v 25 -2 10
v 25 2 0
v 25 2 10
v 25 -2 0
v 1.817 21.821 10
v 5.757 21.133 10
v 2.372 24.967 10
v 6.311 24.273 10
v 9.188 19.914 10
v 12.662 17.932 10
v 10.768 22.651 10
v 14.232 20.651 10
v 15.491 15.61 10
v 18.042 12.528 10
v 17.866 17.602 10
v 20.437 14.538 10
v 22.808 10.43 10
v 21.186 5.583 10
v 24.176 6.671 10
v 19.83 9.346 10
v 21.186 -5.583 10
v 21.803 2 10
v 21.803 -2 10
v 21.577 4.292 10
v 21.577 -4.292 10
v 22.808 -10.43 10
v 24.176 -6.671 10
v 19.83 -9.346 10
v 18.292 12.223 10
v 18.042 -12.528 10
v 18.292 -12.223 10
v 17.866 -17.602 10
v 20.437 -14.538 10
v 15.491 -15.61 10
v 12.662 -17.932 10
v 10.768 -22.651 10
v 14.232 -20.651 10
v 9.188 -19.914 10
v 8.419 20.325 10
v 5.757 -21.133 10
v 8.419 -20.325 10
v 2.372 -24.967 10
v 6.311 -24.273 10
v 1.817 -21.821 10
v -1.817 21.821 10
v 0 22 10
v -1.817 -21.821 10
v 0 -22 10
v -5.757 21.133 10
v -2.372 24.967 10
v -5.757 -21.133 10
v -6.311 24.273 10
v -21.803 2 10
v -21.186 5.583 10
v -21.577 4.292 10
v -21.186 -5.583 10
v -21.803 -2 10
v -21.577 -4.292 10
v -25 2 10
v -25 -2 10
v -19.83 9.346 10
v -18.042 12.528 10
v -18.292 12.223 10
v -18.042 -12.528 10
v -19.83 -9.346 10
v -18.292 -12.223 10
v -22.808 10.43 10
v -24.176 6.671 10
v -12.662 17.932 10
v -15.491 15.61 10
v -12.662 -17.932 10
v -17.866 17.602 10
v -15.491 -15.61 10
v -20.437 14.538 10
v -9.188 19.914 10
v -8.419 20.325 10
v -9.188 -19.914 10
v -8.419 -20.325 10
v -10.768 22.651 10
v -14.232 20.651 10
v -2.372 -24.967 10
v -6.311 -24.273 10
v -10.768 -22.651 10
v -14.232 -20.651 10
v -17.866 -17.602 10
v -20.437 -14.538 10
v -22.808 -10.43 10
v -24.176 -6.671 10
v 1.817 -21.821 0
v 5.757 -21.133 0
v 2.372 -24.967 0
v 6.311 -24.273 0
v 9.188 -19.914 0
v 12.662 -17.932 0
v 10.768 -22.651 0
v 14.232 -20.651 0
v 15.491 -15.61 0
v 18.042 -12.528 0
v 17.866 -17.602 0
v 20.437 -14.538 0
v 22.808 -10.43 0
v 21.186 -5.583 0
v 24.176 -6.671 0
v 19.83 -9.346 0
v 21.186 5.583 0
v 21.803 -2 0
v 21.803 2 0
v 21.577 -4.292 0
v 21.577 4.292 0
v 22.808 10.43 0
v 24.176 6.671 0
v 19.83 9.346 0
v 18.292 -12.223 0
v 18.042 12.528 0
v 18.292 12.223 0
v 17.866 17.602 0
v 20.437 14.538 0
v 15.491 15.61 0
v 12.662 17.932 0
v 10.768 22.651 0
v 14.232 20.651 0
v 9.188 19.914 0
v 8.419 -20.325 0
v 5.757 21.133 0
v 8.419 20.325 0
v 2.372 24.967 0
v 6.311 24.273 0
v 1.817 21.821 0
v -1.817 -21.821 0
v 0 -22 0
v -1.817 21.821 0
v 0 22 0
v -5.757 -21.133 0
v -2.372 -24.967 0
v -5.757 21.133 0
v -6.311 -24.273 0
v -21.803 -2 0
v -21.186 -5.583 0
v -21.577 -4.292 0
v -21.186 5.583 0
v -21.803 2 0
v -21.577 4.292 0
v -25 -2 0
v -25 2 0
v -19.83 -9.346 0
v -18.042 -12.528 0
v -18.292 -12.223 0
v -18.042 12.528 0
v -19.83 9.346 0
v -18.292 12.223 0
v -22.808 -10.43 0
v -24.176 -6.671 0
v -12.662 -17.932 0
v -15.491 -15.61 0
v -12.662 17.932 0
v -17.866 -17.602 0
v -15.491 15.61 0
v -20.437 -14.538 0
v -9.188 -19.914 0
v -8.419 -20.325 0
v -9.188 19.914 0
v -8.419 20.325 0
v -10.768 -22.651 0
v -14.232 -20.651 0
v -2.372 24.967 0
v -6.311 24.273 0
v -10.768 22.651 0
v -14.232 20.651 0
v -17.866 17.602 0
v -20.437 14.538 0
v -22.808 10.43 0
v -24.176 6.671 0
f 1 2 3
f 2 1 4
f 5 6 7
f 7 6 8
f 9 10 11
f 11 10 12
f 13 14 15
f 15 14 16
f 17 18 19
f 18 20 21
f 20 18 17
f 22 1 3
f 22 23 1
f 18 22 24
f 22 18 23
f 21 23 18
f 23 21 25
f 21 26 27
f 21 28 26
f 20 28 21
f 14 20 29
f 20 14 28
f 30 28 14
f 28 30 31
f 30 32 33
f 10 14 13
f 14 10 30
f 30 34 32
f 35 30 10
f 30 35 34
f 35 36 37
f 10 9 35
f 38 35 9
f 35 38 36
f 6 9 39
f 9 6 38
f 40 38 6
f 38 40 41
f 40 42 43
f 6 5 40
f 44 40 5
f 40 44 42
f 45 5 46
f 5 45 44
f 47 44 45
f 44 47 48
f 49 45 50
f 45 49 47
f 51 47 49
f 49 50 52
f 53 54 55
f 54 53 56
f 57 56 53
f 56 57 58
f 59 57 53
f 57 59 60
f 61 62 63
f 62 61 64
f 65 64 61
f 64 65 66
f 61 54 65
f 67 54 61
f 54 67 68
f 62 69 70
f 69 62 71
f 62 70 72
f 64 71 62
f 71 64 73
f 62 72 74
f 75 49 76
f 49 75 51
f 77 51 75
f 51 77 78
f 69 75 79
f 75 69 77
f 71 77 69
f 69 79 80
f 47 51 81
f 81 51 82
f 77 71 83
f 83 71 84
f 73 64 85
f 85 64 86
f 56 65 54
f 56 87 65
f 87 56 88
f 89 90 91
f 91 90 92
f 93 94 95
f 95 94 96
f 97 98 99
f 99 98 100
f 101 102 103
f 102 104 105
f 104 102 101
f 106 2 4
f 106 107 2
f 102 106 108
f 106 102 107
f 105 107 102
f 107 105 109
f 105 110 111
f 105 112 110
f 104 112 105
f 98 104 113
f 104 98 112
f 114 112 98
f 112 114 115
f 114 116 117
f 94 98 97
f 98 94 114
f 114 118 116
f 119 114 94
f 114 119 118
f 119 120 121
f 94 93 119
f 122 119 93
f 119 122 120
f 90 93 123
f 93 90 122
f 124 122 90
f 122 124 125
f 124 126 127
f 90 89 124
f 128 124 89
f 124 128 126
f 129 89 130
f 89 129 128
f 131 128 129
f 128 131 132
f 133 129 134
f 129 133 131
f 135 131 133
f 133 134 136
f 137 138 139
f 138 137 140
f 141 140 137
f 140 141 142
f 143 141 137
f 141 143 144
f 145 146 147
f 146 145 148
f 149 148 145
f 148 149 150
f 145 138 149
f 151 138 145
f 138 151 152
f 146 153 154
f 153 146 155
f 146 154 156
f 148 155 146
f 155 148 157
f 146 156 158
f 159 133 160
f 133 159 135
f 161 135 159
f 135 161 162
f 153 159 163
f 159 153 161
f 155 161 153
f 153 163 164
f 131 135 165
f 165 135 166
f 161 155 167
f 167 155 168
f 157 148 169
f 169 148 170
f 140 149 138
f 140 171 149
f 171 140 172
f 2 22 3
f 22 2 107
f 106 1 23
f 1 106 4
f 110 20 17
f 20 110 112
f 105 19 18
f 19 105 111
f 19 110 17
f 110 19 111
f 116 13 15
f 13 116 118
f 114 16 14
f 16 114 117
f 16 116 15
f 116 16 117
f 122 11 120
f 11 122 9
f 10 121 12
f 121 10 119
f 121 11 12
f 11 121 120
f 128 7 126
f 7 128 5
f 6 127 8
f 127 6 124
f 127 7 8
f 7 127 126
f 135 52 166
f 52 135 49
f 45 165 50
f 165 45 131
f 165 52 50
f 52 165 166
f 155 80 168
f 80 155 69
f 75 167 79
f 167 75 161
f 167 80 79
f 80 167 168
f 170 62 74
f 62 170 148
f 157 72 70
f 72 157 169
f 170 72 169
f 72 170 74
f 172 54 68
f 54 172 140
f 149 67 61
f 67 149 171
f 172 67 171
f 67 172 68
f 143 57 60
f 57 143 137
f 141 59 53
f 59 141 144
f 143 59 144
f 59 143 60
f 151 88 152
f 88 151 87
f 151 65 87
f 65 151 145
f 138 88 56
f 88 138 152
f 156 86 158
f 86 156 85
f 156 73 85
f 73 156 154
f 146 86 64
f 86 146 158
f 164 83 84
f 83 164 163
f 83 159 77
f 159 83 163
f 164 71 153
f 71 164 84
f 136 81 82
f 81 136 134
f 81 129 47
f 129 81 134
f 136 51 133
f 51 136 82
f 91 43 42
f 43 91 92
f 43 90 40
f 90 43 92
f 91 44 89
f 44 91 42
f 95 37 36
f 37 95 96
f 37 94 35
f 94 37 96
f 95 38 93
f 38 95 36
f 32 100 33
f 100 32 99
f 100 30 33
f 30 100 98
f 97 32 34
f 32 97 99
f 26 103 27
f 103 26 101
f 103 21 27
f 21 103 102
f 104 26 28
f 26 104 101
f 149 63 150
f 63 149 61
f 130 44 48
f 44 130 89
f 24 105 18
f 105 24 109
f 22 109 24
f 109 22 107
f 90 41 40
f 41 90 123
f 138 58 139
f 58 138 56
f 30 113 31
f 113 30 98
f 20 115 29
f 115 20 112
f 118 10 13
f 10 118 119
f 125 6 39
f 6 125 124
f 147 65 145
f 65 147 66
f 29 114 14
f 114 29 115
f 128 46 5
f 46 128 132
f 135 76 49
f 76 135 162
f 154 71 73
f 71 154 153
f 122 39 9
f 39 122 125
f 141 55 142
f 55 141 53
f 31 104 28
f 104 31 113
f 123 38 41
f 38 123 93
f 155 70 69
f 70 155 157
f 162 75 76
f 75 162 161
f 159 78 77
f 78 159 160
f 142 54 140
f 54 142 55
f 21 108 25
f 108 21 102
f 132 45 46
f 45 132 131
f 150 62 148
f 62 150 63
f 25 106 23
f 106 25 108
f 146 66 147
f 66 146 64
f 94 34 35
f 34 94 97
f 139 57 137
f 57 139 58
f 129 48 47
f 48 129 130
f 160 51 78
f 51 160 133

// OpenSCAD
$fn = 32;

// ----------------------------------------------------------------------
// Spur blank: plain gear blank
// ----------------------------------------------------------------------

// --- parameters (mm) ---
disc_r = 22;              // blank root radius
disc_t = 10;              // blank thickness
n_teeth = 18;             // stub tooth count
tooth_w = 4;              // tooth width at the root
tooth_h = 3;              // tooth height above the root

out_r = disc_r + tooth_h;  // tip radius
bbox_x = 50.0;  // measured width over the teeth
bbox_y = 49.93;  // measured depth over the teeth

union() {
  cylinder(r = disc_r, h = disc_t);
  for (i = [0 : n_teeth - 1])
    rotate([0, 0, i * 360 / n_teeth])
      translate([disc_r - 1, -tooth_w / 2, 0])
        cube([tooth_h + 1, tooth_w, disc_t]);
}
